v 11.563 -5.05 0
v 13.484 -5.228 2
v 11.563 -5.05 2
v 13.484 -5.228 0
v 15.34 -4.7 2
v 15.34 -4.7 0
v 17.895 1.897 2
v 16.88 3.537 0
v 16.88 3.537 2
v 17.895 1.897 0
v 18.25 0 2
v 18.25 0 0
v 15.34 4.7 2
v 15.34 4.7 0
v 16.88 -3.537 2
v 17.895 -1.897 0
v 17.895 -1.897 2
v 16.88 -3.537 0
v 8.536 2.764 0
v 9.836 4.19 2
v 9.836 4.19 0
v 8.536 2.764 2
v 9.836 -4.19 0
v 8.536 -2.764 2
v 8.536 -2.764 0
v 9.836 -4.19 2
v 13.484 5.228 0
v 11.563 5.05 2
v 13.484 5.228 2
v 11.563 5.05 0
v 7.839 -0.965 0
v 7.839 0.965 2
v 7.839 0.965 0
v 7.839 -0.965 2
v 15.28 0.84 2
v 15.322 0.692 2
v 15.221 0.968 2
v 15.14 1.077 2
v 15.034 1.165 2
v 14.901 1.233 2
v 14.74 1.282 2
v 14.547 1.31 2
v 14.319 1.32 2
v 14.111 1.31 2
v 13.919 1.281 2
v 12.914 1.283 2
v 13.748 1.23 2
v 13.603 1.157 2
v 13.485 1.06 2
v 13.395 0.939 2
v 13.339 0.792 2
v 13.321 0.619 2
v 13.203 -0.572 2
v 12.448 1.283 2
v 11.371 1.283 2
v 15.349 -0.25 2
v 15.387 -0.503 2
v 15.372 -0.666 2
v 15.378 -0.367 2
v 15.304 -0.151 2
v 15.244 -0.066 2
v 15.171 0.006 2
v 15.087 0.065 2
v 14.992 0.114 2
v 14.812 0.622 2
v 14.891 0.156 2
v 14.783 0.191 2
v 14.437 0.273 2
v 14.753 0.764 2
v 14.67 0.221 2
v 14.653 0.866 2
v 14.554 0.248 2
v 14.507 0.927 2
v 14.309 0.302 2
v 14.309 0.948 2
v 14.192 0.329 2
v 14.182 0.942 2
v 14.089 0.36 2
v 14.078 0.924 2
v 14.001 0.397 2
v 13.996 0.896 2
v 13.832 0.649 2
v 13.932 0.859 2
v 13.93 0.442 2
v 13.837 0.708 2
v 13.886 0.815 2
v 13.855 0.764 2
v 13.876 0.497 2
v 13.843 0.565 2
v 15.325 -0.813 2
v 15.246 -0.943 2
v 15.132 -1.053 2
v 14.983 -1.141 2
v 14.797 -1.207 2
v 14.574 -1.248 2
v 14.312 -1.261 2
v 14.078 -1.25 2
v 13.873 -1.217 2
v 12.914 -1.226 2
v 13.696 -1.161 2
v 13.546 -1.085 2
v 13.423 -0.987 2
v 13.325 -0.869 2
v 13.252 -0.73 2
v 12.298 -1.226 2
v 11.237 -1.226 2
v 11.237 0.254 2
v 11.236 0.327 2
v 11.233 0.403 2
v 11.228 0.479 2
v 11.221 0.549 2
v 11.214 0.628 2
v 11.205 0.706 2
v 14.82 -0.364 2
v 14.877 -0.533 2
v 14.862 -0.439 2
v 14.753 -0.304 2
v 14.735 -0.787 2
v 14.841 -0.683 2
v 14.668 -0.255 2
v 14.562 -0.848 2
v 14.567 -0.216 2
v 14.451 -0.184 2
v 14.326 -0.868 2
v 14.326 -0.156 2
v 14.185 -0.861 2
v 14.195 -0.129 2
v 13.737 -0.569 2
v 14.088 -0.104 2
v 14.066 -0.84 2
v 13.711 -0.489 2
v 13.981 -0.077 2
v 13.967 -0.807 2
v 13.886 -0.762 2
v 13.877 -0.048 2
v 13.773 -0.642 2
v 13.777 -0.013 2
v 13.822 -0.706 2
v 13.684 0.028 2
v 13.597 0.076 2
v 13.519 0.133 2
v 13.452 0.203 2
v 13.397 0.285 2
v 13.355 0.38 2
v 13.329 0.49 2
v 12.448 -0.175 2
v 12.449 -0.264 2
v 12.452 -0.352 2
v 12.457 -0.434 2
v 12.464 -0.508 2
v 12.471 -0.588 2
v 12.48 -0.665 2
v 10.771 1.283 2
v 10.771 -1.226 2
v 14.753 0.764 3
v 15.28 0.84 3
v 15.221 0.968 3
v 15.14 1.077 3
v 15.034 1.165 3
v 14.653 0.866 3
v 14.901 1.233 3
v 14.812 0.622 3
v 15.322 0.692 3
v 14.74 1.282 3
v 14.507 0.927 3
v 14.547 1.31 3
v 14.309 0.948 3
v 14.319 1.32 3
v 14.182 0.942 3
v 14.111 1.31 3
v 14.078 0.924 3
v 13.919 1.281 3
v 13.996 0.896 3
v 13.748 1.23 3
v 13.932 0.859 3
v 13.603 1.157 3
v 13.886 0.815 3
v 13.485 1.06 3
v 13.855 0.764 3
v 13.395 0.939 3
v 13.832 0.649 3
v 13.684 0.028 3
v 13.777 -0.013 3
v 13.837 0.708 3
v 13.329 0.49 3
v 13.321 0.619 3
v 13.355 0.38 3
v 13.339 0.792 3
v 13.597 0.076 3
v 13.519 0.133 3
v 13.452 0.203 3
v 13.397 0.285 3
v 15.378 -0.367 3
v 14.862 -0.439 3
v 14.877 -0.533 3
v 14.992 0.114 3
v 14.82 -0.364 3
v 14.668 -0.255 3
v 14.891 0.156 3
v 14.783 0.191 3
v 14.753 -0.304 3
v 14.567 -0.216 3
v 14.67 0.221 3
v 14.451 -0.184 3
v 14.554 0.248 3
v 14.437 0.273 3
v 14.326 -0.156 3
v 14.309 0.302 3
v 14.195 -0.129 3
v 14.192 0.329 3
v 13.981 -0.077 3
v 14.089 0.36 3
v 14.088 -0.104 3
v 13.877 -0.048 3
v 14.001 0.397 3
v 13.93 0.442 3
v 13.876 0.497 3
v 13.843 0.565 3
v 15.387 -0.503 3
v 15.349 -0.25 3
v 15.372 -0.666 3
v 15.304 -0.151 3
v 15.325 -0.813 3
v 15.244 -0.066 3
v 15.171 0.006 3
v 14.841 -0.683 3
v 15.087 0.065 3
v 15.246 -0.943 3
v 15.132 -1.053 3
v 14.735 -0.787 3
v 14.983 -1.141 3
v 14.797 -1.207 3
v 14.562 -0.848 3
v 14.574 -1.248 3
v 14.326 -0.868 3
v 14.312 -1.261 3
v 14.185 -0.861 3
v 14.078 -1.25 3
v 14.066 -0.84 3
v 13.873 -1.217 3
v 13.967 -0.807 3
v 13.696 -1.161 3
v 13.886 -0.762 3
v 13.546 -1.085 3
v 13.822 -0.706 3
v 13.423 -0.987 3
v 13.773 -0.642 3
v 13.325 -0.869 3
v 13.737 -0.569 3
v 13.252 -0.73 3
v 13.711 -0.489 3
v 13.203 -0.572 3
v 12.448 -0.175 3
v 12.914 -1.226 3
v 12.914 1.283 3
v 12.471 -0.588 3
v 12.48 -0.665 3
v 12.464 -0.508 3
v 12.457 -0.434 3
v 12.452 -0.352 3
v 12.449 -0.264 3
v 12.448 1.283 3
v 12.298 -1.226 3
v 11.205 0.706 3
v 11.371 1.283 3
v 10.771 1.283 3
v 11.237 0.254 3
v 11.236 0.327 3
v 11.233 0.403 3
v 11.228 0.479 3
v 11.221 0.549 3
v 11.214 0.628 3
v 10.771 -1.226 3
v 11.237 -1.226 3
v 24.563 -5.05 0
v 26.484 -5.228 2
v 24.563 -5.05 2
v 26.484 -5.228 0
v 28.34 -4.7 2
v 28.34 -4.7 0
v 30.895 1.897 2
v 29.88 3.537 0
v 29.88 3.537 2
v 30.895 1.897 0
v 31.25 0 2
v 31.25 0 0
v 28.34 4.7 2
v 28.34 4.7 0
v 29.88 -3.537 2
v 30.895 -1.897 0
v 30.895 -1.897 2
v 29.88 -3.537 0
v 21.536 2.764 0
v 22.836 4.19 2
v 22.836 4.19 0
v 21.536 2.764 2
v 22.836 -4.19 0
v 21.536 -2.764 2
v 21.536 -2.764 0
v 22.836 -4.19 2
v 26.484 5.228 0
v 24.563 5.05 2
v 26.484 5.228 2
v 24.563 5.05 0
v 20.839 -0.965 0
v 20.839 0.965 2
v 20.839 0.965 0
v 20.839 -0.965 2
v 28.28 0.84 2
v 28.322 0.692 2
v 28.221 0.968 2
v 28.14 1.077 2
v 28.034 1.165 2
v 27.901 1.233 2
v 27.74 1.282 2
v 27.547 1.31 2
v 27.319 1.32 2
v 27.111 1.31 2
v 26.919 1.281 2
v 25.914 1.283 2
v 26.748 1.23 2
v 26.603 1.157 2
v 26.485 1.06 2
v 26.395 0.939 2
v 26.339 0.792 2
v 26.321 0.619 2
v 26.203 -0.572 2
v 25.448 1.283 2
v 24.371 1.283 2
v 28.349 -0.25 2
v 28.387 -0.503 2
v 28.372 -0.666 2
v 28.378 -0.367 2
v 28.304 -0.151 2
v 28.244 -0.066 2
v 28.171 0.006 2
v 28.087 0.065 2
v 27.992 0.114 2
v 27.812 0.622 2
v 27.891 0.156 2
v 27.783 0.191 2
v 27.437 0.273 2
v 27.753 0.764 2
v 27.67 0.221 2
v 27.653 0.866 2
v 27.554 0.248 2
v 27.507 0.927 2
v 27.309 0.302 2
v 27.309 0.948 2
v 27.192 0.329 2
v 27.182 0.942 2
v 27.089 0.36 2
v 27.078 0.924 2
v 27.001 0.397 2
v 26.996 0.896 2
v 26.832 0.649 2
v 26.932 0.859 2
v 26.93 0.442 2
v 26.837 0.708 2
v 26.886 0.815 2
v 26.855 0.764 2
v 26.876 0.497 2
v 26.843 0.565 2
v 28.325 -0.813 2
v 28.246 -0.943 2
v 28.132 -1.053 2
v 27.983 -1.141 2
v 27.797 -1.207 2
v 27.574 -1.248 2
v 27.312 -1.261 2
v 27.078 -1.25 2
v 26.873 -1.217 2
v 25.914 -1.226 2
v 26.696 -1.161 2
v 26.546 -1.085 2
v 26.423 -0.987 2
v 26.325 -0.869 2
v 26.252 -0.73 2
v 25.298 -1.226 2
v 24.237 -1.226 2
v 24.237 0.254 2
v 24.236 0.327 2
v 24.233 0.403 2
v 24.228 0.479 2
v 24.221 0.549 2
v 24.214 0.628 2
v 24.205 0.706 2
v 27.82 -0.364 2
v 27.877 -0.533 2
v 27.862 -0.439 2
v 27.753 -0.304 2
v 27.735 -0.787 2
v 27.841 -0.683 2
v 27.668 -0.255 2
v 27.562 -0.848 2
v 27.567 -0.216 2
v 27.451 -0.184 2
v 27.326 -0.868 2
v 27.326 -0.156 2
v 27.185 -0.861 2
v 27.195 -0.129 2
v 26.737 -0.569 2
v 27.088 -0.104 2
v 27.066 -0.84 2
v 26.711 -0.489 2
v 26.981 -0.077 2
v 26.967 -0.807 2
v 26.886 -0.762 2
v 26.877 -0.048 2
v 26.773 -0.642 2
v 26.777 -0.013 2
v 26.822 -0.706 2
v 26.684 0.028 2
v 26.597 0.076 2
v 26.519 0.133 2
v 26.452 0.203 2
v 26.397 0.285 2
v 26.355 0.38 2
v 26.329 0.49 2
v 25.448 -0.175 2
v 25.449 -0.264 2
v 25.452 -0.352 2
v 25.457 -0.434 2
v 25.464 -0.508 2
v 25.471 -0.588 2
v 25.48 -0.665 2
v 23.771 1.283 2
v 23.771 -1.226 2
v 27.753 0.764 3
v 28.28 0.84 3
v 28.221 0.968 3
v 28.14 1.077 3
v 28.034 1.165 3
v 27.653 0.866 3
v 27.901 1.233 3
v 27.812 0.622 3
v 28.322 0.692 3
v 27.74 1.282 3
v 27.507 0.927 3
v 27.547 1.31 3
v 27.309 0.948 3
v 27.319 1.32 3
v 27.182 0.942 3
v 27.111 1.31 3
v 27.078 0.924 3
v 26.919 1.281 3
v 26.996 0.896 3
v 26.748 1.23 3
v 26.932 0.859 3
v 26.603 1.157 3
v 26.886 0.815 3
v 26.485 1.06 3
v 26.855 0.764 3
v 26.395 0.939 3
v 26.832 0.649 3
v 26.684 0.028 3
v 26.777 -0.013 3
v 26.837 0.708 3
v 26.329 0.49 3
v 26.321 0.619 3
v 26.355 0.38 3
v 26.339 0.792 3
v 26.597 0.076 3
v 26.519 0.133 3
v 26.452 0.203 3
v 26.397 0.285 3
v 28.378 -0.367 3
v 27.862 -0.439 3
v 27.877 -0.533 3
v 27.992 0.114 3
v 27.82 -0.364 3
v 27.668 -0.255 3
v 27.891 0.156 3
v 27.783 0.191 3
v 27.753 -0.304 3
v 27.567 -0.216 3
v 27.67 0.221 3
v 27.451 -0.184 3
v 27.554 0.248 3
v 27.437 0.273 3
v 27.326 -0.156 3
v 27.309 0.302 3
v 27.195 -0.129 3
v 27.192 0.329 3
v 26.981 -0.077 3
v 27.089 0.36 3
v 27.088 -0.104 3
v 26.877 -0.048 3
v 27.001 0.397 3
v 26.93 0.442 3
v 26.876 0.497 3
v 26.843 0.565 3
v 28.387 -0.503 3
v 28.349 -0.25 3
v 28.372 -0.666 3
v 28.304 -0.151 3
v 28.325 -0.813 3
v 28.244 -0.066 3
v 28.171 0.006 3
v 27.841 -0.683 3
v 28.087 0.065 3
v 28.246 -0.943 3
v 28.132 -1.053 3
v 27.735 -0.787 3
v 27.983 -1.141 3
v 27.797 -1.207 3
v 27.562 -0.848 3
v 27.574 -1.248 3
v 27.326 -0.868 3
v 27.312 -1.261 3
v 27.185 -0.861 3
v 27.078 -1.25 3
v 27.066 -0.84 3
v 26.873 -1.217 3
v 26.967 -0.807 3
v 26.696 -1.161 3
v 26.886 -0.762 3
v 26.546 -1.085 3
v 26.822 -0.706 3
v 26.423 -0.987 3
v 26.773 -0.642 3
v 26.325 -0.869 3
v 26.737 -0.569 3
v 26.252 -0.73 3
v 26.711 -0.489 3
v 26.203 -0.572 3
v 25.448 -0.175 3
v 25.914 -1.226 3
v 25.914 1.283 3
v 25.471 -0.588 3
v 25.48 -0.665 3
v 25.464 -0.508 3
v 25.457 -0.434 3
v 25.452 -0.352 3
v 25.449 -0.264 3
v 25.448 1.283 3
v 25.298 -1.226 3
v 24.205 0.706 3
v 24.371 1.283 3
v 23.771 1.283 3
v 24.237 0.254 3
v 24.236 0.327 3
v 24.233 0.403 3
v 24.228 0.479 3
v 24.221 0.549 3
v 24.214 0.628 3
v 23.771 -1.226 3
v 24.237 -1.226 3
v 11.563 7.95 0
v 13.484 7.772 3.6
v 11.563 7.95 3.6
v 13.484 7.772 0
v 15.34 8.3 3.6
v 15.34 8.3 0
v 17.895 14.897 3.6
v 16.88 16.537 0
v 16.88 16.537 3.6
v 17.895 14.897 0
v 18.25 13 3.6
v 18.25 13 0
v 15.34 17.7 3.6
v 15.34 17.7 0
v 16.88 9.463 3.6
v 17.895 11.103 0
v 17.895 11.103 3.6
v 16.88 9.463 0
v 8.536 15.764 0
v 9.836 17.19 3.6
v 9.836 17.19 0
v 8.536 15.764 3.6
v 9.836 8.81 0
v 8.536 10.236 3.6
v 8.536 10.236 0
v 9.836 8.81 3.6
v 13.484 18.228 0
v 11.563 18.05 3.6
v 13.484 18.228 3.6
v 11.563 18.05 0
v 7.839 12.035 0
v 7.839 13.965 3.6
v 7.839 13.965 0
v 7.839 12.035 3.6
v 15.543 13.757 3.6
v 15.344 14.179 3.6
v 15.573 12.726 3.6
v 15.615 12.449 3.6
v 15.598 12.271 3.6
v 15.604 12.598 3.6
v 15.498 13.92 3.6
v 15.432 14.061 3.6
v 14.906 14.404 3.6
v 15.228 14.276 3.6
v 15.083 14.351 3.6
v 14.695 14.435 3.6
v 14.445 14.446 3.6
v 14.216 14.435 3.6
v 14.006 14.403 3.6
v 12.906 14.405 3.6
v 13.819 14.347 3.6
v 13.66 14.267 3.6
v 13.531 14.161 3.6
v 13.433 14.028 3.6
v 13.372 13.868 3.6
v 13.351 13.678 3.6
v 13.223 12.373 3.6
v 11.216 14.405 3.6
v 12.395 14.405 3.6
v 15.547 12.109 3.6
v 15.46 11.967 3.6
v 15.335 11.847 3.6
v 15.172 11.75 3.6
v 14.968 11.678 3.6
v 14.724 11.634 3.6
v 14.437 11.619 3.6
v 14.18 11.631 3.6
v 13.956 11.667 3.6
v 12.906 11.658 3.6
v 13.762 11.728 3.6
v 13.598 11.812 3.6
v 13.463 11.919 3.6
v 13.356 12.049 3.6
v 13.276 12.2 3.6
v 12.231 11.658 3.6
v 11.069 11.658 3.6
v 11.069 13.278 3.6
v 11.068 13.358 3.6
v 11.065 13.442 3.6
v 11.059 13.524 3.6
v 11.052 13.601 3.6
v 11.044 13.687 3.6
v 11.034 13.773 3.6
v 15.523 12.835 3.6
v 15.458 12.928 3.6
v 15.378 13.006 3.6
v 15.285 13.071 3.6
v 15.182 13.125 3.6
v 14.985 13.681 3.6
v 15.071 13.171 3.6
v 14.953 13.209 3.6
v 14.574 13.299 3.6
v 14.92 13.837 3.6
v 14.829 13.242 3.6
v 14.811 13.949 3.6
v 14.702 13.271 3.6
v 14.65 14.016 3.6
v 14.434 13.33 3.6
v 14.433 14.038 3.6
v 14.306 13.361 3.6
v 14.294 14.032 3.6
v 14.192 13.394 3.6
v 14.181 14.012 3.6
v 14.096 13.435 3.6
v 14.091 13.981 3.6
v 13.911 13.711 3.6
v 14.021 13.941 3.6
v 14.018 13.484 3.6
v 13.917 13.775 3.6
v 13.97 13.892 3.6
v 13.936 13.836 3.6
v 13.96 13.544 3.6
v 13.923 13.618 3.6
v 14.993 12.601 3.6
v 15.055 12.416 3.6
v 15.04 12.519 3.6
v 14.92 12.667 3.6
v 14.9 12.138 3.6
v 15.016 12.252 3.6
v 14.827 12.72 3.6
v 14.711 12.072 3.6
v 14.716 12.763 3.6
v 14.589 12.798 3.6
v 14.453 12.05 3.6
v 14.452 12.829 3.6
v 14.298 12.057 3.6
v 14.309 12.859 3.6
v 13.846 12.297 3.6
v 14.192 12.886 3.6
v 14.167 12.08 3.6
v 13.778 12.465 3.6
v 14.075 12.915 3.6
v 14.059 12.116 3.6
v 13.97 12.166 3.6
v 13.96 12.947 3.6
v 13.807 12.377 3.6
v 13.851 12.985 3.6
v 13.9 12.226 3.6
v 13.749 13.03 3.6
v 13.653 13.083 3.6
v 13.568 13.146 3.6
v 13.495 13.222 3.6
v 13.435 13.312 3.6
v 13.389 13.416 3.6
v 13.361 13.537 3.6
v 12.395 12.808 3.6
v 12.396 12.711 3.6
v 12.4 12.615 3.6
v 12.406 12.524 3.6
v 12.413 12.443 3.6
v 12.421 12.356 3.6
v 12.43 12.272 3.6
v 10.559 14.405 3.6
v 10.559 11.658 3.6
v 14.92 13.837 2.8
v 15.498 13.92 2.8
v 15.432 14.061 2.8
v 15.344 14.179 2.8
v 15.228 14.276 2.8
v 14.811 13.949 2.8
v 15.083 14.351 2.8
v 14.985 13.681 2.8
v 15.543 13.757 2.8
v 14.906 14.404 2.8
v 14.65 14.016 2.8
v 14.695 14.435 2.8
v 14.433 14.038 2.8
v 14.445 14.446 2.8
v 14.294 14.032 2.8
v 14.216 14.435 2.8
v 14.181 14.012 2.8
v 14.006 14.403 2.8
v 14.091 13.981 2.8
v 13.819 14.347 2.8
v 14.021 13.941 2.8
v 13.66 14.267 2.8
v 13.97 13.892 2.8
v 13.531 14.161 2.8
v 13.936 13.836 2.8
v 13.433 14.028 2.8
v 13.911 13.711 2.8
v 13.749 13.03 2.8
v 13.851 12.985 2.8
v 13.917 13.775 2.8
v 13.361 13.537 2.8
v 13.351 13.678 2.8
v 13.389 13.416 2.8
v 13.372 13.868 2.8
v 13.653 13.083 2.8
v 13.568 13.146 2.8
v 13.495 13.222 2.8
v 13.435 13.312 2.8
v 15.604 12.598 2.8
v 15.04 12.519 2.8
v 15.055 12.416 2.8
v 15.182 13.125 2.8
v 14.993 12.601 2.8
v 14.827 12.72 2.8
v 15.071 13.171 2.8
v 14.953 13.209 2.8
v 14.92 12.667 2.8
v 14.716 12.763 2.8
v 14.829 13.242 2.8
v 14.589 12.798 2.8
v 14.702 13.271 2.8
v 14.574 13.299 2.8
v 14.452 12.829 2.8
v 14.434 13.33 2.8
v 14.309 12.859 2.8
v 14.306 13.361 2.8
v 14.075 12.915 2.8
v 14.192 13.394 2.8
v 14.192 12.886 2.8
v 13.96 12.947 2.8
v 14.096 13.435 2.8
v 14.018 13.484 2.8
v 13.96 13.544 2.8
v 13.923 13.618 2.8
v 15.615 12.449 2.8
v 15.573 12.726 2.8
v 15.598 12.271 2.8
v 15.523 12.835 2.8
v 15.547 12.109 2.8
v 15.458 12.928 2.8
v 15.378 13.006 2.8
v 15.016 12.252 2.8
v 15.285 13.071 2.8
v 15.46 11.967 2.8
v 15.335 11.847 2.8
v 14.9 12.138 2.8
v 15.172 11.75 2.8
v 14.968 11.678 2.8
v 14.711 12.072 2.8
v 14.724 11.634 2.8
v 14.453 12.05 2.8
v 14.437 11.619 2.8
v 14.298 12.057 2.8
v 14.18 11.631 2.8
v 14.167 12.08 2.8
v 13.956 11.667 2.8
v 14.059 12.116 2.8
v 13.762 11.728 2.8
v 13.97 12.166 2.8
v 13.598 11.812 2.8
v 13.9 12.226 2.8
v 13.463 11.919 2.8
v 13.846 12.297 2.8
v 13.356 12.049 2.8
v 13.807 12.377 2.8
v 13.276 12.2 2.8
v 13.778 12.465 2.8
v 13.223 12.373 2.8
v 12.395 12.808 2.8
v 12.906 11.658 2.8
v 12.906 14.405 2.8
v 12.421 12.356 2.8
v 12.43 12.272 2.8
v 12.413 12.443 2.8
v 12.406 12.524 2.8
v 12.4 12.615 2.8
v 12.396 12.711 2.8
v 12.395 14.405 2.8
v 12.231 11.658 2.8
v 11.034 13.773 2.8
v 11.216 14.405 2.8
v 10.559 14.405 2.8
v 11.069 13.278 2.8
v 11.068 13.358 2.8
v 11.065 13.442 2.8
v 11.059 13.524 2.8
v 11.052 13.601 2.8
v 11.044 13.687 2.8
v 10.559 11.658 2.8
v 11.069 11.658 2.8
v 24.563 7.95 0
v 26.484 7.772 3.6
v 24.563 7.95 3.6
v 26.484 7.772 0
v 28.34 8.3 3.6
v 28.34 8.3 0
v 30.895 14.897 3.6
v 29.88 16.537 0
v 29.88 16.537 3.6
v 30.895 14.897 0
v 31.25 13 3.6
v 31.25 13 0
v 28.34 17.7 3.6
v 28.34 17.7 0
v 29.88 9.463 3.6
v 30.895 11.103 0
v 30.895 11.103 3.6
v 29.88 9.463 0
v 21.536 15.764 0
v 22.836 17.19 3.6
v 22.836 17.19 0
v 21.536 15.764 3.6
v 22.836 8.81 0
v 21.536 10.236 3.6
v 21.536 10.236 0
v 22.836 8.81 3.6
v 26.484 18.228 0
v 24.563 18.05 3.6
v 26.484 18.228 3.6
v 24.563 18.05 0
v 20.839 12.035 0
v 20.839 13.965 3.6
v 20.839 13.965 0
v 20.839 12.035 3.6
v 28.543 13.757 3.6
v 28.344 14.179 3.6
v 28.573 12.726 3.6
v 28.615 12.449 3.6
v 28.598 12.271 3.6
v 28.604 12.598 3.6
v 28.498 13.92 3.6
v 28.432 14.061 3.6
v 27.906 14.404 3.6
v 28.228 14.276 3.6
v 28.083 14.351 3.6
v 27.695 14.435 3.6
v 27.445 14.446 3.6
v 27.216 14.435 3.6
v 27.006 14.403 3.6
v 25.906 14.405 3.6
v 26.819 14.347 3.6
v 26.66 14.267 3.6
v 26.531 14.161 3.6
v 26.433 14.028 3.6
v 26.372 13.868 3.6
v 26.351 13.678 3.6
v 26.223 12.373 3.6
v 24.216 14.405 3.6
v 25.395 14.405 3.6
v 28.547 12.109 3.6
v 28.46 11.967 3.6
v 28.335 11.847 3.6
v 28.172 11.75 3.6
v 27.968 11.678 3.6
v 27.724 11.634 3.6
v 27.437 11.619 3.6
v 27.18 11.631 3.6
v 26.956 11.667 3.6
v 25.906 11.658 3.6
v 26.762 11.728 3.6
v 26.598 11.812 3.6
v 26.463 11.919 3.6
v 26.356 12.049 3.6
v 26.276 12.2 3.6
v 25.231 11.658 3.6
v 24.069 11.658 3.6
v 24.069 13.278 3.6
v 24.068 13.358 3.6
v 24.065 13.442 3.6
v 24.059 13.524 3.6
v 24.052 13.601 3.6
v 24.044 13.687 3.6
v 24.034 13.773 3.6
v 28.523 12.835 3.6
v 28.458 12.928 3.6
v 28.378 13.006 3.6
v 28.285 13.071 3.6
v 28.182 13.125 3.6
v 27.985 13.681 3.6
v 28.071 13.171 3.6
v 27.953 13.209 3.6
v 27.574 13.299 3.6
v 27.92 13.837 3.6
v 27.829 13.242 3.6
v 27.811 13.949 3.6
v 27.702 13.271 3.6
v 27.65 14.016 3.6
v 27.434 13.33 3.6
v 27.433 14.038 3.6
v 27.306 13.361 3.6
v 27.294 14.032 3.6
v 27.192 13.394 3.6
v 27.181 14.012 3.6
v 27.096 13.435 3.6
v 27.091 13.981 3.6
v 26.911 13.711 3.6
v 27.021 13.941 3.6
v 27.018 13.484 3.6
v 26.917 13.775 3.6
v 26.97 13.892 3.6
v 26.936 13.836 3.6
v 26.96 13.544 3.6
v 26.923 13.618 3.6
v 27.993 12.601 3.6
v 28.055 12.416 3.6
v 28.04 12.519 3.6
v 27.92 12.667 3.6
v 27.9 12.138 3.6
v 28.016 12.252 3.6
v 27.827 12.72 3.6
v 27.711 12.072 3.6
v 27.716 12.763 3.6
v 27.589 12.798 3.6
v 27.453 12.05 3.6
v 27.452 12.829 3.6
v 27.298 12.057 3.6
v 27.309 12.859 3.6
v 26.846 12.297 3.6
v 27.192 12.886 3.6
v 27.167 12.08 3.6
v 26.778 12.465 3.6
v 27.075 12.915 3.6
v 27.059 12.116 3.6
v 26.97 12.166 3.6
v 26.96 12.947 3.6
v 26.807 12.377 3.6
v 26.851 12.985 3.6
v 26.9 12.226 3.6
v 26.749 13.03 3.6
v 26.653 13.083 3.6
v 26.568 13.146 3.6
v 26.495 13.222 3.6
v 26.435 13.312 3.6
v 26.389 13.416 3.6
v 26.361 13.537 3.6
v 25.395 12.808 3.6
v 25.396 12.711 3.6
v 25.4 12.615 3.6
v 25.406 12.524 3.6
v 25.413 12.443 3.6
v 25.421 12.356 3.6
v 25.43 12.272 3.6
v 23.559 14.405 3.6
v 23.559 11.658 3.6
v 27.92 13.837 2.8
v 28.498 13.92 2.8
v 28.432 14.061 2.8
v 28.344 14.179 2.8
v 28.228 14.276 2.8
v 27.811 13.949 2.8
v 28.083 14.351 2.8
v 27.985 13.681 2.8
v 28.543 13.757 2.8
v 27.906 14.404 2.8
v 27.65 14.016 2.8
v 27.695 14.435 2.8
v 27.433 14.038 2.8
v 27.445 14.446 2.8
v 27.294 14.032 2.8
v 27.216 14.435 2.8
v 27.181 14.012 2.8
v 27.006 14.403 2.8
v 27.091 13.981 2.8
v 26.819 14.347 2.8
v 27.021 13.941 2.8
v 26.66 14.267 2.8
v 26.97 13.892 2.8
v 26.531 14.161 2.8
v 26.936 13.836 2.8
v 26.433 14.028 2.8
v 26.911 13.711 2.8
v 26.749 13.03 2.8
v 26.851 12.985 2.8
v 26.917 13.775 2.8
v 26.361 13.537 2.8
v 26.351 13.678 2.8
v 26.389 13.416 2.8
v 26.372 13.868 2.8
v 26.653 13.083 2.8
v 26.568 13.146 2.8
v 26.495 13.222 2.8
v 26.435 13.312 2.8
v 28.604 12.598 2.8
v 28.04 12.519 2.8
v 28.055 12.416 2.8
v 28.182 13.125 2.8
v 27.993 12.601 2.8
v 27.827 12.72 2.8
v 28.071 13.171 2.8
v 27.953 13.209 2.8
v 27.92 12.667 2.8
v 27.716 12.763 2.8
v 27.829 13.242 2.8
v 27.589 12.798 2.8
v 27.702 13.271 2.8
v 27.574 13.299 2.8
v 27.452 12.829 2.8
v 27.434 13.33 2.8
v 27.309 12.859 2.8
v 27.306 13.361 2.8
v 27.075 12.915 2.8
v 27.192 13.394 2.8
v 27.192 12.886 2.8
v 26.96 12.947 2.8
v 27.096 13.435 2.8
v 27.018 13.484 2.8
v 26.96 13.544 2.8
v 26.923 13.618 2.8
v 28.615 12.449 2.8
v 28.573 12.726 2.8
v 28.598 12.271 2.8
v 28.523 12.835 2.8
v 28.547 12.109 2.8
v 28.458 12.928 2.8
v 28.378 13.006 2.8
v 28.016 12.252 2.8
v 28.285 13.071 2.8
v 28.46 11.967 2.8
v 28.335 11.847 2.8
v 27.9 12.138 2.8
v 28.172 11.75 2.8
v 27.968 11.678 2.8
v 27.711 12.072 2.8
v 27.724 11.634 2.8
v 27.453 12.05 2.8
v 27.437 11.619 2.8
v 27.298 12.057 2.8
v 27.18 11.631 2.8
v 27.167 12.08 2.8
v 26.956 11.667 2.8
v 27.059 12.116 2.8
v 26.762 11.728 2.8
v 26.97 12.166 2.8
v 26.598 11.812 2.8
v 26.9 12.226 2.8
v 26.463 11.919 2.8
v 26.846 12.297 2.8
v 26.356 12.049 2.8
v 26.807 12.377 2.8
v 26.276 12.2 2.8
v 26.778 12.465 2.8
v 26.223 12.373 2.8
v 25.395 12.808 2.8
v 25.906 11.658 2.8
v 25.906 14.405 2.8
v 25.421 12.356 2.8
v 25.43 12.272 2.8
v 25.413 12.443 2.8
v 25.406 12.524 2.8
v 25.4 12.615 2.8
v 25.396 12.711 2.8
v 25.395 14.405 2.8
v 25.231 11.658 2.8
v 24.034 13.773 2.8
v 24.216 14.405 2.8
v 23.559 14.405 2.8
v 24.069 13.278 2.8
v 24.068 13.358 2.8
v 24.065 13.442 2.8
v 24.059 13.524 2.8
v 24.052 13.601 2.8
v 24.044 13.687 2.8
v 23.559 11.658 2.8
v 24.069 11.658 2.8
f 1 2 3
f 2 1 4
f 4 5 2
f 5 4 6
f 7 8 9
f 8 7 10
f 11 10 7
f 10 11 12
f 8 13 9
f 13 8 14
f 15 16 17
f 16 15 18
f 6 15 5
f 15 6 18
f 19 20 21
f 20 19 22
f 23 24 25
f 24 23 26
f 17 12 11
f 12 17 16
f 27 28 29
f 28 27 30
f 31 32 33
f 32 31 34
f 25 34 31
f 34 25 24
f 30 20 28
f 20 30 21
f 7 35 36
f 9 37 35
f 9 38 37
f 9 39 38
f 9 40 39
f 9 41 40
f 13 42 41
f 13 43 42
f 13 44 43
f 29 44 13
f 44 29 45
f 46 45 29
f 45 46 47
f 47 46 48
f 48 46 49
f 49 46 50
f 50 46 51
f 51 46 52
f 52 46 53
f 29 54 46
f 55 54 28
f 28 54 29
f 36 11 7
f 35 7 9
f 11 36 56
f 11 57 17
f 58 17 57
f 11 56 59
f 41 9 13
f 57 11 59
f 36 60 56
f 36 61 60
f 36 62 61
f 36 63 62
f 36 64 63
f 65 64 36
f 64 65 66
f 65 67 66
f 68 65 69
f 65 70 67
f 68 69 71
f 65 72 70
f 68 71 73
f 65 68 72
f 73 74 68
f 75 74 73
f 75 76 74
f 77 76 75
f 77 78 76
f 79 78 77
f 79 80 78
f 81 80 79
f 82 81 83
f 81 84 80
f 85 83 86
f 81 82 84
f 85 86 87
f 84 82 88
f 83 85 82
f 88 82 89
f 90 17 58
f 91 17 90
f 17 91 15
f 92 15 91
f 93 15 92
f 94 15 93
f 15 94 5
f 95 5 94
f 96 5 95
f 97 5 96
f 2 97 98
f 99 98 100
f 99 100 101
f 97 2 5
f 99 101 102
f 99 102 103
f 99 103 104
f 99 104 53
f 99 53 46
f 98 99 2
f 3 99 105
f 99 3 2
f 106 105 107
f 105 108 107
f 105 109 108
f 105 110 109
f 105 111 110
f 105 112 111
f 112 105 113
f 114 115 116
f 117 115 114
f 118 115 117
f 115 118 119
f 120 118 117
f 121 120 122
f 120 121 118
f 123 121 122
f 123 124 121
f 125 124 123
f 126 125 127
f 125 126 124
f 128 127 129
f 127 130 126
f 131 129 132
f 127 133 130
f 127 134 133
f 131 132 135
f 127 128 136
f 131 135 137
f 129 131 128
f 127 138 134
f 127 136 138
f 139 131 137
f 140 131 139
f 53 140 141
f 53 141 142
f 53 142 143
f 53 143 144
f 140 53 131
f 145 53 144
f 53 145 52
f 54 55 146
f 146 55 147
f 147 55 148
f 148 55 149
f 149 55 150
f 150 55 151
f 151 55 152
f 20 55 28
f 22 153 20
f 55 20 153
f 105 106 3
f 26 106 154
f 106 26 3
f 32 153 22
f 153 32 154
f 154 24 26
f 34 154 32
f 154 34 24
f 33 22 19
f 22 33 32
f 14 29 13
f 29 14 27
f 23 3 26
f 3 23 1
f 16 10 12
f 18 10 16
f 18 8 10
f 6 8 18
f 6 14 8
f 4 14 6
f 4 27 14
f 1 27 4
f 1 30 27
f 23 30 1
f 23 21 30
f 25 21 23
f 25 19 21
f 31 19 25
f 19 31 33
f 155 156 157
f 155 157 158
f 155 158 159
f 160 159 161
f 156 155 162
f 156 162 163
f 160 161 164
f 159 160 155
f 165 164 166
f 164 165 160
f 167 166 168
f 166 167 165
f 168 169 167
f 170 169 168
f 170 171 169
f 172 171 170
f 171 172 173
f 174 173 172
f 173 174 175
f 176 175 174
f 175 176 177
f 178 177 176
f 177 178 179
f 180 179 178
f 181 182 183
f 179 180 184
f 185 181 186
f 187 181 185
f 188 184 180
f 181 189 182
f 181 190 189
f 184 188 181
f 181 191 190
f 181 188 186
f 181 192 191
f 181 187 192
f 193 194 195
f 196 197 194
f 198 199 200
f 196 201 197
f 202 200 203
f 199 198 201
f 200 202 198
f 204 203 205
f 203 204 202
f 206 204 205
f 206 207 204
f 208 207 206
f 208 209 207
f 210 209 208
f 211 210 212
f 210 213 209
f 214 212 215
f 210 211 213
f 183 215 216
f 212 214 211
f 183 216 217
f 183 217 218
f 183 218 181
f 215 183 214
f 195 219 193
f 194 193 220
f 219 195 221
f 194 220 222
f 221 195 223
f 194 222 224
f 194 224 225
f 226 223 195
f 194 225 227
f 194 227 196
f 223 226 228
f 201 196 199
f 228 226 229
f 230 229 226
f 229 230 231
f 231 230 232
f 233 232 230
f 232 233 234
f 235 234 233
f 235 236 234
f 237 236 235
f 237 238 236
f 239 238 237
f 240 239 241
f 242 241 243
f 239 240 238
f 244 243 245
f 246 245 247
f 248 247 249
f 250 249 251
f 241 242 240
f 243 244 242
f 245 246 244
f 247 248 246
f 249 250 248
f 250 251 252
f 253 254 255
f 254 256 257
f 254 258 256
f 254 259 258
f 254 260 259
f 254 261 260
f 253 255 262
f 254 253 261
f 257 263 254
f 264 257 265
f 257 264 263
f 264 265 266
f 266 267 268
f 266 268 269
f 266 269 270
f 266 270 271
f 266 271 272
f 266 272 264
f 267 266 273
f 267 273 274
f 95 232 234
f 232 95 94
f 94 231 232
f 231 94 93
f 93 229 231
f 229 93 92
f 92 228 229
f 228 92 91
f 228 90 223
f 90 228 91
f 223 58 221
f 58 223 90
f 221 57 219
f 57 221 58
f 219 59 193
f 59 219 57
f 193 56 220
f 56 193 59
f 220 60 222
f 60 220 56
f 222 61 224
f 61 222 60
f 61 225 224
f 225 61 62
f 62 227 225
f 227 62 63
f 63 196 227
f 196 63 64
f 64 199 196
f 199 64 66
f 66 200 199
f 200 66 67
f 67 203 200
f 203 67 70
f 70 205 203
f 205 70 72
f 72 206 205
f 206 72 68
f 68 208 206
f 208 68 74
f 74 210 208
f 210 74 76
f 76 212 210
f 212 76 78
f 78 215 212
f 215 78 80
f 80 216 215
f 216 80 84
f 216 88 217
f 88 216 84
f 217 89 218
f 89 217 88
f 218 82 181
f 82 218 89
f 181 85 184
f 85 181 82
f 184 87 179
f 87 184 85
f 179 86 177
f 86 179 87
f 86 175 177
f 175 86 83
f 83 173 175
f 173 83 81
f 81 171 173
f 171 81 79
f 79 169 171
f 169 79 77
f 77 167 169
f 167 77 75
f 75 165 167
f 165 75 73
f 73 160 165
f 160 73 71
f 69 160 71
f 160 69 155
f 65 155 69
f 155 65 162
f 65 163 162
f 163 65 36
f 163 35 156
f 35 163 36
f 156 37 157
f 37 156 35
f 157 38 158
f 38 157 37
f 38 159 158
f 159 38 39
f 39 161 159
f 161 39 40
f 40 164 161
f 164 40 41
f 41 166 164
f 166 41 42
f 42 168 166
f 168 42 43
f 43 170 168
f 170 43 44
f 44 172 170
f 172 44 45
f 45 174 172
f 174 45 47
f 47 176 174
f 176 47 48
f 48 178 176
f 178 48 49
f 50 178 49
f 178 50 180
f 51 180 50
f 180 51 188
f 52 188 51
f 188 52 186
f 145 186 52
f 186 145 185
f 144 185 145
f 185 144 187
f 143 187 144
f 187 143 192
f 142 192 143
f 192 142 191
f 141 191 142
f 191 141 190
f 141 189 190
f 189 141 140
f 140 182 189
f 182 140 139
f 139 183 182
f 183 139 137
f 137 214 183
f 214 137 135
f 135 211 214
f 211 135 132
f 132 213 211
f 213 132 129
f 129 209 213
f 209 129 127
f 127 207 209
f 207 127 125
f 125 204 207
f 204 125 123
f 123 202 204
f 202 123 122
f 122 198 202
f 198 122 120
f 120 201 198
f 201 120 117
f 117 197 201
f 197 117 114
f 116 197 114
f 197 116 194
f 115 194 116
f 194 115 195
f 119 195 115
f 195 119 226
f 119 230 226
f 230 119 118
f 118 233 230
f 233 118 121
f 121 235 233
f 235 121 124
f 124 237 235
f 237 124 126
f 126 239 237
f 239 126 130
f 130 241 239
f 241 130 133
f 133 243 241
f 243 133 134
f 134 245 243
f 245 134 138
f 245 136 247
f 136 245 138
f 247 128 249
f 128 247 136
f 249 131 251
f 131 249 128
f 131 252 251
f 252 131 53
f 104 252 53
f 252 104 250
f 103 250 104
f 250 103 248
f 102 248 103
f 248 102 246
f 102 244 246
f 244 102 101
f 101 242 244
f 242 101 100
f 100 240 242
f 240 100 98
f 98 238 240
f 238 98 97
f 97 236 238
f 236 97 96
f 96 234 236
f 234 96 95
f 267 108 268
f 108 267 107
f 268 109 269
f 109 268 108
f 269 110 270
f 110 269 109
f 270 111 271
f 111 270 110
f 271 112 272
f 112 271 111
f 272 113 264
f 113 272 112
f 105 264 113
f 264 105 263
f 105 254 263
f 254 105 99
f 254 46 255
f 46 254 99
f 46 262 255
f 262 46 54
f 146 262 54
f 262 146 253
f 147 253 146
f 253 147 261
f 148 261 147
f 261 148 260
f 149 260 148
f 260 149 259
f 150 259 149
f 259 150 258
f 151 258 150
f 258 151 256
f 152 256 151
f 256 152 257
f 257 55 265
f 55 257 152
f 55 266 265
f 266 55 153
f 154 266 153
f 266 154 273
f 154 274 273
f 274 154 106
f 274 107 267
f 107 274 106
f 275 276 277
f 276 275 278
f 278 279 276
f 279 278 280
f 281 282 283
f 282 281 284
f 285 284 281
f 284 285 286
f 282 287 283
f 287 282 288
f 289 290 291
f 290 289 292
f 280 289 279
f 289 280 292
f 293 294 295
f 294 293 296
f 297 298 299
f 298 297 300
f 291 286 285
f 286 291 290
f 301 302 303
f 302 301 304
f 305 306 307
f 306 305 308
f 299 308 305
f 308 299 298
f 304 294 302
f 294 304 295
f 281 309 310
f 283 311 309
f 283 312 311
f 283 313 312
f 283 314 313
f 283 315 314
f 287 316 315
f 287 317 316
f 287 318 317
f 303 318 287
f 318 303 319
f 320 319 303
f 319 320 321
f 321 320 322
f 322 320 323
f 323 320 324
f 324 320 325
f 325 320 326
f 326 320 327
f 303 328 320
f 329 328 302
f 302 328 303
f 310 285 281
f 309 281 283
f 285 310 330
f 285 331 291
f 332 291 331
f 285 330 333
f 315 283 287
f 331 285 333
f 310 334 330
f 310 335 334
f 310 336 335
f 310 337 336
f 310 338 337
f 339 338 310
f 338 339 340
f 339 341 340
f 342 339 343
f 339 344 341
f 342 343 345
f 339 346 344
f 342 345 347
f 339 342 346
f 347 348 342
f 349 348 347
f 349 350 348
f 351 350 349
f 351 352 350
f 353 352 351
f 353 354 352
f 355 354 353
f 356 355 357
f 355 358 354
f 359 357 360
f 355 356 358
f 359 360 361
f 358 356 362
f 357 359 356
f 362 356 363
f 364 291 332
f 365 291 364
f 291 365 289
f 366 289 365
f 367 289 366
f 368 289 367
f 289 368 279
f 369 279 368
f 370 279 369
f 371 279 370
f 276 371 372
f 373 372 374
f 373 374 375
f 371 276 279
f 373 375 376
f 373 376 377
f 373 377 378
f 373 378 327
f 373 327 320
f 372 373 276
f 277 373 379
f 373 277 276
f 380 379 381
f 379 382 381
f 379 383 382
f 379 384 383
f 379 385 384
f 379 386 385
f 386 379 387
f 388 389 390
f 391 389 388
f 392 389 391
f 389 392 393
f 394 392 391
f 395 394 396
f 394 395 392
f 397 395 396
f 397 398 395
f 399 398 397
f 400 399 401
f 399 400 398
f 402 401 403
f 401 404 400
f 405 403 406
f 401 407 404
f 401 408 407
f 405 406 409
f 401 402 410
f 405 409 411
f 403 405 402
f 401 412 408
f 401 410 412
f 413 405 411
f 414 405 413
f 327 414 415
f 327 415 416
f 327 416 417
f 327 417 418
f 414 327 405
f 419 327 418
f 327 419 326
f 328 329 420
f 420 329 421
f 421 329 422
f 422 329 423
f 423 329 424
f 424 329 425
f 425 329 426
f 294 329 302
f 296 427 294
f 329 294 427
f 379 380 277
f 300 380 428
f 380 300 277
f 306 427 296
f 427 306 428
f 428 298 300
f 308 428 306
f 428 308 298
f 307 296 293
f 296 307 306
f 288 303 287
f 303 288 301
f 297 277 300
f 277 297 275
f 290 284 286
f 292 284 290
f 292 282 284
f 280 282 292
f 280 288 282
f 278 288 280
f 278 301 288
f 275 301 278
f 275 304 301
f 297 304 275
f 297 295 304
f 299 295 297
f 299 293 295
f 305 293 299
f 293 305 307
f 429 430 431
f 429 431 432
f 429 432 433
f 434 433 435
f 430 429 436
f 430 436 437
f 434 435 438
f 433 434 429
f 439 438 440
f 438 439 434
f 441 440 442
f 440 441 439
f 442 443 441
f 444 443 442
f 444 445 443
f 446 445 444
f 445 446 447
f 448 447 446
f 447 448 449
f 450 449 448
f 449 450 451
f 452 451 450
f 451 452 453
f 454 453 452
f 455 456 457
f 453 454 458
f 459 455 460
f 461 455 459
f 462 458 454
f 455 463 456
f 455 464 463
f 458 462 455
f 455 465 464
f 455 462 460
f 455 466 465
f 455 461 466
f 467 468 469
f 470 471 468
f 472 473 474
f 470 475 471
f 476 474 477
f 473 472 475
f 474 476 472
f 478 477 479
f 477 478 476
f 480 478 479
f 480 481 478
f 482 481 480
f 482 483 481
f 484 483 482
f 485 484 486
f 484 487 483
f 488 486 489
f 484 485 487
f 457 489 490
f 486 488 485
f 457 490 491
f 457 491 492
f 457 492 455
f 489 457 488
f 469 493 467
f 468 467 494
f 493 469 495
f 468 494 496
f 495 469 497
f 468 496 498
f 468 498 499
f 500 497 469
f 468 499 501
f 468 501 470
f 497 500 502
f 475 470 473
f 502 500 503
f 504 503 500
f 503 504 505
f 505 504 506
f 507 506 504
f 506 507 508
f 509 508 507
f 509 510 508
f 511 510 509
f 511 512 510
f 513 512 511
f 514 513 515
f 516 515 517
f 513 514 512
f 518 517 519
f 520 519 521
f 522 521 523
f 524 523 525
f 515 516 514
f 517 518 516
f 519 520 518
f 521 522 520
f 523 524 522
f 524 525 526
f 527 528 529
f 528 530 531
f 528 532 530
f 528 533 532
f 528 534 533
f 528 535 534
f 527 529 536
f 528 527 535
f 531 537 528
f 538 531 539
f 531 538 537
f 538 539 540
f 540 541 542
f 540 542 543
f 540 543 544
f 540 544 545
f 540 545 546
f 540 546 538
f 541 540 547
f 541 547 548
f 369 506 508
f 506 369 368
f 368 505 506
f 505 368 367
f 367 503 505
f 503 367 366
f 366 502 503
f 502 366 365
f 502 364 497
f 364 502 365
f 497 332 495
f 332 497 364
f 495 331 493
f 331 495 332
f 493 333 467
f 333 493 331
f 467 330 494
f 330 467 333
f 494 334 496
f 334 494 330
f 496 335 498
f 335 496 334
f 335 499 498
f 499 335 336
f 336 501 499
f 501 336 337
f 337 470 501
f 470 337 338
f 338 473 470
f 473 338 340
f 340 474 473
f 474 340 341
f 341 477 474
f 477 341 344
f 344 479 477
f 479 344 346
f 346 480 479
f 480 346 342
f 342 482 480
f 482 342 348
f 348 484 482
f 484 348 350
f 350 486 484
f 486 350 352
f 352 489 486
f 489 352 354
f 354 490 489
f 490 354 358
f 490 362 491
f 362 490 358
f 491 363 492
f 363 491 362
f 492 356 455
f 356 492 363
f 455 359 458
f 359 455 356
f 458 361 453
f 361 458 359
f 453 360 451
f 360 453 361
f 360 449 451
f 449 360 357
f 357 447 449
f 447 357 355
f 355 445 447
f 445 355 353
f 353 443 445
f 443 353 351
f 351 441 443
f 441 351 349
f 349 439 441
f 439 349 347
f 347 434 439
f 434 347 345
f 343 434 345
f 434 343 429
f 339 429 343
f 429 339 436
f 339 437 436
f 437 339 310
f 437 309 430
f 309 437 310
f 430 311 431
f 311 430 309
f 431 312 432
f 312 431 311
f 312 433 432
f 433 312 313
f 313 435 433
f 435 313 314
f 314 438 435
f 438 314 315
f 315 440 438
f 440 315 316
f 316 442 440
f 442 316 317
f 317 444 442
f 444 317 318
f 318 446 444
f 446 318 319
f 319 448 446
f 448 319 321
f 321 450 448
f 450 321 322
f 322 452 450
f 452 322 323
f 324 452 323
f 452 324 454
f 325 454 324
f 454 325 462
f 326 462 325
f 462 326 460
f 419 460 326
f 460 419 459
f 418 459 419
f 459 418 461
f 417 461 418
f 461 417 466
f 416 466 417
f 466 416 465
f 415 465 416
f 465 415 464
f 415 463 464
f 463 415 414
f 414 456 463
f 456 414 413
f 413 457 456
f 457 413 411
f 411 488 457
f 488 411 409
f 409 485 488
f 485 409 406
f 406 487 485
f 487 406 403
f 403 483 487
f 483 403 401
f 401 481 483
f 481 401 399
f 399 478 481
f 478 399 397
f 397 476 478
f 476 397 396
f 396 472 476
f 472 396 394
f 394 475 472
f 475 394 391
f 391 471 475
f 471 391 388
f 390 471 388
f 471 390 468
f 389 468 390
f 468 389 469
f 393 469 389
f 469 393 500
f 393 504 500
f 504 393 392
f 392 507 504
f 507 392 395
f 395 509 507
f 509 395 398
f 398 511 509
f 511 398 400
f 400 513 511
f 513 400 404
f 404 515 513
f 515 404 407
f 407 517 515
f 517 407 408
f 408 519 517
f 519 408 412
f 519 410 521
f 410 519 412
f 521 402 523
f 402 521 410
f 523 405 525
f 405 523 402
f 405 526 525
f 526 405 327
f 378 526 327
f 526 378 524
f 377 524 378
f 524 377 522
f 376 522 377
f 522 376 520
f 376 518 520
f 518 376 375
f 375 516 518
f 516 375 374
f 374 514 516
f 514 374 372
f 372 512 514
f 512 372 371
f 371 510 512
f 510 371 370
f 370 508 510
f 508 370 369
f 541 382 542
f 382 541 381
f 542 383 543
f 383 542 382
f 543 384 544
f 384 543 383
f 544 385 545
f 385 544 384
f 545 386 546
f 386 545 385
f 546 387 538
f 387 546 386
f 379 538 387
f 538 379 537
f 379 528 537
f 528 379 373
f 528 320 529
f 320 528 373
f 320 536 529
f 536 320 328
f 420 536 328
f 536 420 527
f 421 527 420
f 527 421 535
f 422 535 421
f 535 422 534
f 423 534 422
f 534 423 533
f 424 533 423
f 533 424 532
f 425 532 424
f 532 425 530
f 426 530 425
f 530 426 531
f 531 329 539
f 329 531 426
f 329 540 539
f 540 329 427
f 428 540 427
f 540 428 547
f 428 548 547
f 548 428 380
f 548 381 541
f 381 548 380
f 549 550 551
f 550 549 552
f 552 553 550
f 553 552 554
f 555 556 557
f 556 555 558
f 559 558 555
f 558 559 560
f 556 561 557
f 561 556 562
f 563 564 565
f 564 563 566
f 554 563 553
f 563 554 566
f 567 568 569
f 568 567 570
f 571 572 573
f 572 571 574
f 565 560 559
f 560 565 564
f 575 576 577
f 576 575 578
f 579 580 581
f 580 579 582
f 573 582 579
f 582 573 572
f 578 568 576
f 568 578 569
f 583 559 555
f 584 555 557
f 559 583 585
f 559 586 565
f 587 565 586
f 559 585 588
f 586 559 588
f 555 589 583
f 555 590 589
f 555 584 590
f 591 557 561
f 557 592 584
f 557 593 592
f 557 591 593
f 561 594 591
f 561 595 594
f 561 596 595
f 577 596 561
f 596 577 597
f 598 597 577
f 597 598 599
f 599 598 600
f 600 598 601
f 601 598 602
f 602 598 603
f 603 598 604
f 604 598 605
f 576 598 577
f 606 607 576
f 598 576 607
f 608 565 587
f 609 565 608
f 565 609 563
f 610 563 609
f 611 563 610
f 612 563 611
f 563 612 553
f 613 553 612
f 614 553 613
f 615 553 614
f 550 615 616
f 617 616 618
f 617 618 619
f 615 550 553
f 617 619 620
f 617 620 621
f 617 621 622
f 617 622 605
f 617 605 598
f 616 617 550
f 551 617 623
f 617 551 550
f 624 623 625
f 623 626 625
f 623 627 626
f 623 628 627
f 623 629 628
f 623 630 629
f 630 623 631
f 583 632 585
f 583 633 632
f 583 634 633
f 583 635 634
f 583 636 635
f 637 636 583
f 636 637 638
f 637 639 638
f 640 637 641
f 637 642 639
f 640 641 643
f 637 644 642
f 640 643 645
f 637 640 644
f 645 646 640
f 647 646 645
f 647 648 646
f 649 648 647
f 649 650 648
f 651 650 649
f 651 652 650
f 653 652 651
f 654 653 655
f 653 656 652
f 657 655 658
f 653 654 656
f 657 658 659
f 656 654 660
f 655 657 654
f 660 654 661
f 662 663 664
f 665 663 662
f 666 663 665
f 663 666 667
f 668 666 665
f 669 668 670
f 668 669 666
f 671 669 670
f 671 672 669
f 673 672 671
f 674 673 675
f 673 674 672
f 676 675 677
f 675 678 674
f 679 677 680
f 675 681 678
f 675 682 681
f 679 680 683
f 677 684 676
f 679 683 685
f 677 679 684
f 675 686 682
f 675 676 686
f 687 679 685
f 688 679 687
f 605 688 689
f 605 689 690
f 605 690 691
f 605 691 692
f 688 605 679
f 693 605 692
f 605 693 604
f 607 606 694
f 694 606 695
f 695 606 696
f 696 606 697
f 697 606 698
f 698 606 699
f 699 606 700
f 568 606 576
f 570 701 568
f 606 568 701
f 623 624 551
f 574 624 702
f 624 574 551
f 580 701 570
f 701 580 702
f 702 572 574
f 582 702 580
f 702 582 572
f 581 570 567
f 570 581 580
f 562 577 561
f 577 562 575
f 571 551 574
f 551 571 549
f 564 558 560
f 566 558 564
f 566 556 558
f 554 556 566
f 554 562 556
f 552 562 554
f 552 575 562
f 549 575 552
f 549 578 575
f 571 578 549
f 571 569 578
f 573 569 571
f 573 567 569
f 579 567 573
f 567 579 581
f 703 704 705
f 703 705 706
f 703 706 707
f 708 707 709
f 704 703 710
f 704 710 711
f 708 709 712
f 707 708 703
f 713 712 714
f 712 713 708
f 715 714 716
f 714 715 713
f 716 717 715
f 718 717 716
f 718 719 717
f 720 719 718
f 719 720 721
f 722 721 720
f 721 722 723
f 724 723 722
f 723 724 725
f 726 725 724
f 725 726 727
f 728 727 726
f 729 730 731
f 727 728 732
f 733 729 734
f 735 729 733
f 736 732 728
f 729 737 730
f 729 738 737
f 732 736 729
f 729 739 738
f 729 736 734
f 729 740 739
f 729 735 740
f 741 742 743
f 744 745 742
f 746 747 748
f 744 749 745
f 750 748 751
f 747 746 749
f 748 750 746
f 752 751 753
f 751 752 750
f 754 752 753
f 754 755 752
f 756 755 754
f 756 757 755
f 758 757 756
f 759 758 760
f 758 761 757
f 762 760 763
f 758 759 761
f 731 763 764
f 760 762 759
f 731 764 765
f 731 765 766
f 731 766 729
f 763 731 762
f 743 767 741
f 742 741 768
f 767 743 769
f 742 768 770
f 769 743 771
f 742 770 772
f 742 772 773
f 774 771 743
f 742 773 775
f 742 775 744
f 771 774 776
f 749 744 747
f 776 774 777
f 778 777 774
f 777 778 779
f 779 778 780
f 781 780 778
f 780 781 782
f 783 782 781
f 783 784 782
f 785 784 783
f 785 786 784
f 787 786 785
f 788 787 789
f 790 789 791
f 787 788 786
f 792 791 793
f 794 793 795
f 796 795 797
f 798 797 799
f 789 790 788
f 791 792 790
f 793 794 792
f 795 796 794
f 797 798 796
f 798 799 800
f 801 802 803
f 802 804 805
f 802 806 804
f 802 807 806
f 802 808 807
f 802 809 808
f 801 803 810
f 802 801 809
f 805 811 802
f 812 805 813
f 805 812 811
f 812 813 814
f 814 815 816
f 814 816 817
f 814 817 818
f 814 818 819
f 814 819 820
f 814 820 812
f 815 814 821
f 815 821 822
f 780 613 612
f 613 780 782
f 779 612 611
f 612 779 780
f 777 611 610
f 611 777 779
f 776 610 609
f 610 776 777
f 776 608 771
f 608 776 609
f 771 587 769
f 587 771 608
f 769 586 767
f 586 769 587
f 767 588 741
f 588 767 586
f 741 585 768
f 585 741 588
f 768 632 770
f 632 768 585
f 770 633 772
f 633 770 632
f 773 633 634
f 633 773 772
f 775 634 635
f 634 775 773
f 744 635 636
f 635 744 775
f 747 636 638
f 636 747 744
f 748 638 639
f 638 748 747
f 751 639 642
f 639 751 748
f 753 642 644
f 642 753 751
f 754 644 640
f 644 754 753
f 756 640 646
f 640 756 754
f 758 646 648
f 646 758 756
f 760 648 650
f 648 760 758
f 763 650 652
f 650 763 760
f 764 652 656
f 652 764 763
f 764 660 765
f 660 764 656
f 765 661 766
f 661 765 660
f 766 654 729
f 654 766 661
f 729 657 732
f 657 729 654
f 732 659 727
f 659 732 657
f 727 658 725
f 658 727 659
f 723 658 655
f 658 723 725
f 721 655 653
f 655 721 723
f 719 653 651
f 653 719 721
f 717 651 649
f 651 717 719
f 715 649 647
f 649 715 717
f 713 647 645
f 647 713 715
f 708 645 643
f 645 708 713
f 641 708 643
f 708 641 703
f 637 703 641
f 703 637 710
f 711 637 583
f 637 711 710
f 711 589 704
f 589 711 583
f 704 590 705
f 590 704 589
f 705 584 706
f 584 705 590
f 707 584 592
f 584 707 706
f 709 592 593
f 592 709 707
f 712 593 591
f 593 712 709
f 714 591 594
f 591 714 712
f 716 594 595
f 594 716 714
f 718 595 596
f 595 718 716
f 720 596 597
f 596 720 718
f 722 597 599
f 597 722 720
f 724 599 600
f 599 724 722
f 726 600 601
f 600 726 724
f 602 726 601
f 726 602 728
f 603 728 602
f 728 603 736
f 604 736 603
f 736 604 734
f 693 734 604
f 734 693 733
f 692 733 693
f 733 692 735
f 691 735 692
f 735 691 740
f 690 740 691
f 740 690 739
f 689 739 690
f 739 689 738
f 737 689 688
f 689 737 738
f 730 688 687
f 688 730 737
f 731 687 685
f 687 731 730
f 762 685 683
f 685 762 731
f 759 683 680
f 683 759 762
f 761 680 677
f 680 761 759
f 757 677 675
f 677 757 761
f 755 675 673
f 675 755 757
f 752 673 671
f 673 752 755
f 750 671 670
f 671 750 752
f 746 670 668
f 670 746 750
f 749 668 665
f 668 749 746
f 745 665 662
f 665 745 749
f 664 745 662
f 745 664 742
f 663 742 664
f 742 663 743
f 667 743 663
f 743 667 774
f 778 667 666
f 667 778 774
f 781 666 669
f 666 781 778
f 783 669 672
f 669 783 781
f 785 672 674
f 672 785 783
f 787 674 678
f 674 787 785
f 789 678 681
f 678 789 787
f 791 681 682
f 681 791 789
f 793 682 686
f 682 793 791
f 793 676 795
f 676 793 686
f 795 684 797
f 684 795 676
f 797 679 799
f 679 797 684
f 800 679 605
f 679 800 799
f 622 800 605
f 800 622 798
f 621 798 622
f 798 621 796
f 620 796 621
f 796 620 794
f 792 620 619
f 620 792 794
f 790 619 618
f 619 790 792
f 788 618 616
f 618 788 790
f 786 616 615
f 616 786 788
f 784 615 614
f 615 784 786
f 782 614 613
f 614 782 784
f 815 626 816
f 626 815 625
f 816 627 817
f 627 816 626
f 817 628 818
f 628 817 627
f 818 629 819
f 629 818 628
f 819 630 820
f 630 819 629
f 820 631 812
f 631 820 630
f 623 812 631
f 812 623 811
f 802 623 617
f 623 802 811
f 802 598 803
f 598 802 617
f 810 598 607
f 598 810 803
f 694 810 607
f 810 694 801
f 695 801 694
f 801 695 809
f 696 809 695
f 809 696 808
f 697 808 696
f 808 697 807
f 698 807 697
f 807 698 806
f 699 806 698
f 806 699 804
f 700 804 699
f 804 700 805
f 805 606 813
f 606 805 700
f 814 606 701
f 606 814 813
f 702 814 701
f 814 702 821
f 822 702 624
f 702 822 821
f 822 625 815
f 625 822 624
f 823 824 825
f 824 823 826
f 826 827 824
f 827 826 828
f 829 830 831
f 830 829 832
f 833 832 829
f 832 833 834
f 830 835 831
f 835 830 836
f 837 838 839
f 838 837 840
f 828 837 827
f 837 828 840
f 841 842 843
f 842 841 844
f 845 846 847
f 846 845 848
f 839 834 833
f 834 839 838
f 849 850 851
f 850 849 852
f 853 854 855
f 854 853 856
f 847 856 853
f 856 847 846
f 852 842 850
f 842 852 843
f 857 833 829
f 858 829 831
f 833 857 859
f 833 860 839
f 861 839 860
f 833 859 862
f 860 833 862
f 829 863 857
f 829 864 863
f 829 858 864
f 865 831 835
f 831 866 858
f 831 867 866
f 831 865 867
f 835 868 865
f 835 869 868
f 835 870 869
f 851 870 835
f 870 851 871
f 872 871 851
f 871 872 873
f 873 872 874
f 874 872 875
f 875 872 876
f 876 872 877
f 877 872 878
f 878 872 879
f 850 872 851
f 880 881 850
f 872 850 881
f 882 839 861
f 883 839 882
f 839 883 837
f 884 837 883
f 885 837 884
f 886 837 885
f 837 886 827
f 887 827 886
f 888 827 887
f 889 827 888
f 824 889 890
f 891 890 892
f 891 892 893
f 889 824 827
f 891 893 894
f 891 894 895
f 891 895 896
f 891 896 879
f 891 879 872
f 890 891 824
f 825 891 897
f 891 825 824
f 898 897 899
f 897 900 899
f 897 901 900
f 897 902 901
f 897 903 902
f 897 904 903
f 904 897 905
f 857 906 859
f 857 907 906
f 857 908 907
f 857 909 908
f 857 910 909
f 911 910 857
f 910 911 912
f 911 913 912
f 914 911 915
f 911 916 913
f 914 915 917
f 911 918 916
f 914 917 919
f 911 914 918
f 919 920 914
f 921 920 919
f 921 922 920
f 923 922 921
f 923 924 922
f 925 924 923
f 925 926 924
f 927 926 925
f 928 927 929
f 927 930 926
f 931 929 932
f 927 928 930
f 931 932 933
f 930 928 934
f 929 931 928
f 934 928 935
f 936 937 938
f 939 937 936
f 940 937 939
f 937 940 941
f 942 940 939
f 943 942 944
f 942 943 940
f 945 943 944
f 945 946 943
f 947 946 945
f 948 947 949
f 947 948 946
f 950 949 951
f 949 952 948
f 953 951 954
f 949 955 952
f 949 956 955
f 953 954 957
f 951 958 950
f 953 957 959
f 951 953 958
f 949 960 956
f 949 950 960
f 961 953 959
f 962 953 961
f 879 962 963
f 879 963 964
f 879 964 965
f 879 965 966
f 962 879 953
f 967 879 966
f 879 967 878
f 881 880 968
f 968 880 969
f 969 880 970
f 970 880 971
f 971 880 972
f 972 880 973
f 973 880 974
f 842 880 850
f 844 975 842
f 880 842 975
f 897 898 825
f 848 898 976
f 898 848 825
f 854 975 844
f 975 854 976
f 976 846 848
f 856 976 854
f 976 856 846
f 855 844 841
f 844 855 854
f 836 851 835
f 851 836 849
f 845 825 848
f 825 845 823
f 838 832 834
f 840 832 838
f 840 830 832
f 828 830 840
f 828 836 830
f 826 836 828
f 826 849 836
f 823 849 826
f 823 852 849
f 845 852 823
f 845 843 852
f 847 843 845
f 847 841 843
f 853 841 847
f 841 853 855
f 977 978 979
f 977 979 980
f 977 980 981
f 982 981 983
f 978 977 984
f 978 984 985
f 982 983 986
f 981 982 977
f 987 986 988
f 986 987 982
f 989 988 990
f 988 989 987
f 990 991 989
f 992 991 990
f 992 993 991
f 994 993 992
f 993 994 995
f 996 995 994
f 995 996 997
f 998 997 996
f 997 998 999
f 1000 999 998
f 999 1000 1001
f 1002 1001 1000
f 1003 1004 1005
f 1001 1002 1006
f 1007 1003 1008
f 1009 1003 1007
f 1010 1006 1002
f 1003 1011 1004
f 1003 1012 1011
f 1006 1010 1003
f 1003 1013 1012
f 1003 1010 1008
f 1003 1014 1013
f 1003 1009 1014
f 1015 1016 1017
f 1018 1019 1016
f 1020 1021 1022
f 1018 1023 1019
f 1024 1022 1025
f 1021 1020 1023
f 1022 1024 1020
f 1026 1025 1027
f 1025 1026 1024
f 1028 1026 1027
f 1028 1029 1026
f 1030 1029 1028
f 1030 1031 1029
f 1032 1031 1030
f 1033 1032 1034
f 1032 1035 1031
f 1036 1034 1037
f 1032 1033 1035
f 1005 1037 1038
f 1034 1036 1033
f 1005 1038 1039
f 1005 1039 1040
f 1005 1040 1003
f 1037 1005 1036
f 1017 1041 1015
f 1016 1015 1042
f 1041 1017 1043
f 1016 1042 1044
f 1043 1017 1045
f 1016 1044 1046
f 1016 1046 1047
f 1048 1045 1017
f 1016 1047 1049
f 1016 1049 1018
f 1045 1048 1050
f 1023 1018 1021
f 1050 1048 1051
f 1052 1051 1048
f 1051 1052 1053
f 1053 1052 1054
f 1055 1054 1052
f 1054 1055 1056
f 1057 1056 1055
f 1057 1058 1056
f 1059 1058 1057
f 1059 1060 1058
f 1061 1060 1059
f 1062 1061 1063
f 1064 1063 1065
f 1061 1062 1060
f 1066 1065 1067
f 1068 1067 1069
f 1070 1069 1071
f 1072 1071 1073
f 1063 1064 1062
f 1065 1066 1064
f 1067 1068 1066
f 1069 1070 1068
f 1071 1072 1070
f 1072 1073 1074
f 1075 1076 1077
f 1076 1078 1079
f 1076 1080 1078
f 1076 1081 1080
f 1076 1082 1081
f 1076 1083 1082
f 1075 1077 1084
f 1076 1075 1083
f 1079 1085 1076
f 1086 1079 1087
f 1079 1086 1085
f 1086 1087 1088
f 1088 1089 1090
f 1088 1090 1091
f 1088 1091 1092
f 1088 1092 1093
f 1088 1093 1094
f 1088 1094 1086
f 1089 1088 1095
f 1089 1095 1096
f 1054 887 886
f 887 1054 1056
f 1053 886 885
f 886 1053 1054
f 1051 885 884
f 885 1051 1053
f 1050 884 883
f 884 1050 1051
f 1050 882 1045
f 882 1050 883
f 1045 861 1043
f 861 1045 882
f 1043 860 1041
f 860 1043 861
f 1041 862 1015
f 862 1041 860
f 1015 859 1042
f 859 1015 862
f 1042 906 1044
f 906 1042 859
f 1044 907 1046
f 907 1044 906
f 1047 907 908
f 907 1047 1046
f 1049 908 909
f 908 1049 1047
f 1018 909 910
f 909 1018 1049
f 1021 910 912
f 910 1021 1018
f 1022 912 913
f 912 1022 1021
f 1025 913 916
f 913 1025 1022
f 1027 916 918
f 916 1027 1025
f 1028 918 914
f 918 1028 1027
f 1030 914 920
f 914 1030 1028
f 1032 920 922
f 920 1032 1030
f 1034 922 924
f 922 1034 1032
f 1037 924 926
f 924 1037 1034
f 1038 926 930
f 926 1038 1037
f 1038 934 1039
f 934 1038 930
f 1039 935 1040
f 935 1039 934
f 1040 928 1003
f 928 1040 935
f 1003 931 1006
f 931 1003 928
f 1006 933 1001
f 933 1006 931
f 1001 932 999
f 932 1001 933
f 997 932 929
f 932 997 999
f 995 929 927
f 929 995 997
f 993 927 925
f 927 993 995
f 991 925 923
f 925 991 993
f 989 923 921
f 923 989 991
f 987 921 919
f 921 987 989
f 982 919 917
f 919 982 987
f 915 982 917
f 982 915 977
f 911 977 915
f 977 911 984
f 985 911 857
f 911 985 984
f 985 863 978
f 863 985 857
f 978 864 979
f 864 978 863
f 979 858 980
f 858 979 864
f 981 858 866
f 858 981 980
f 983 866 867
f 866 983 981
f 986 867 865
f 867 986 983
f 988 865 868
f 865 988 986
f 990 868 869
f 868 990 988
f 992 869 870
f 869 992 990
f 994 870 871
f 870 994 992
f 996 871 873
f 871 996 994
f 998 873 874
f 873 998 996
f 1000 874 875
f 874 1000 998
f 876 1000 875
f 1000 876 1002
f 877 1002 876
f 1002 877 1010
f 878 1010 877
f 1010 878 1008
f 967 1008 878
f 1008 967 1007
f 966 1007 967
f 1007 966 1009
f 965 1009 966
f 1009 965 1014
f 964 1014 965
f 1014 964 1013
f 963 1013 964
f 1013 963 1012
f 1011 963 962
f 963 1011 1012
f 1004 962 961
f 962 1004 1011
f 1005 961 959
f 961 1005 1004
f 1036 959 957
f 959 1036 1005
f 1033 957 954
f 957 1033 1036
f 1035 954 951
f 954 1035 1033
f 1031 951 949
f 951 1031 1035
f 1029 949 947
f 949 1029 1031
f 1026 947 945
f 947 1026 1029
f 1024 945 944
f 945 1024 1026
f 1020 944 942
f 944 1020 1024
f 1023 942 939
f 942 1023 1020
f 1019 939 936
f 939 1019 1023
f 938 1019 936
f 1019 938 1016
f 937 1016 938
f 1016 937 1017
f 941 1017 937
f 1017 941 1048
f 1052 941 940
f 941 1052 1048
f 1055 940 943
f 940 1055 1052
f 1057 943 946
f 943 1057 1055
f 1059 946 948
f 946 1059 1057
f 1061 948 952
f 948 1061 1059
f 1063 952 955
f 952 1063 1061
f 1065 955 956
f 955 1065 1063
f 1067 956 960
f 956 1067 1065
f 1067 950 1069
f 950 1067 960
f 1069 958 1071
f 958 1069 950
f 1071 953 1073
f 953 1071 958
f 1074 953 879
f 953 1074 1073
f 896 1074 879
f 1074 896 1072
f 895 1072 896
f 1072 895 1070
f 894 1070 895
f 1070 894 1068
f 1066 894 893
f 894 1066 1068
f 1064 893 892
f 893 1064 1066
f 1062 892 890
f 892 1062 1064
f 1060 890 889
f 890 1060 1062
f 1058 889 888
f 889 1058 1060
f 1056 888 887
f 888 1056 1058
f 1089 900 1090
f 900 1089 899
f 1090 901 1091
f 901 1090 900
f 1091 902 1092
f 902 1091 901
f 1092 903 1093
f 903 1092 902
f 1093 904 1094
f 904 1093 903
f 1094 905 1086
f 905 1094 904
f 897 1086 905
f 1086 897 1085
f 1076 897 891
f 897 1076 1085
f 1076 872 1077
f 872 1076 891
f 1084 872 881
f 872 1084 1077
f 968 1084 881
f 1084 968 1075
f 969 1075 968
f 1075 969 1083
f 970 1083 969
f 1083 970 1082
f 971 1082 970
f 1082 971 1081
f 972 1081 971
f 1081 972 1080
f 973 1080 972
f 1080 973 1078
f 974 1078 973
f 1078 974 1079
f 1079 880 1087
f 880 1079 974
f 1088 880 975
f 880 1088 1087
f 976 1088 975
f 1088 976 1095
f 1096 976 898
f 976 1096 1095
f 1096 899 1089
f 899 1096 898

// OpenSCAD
include <../../Scripts/18xx tiles basic functions.scad>
make_token_array("NS",2,2,0,"th");
